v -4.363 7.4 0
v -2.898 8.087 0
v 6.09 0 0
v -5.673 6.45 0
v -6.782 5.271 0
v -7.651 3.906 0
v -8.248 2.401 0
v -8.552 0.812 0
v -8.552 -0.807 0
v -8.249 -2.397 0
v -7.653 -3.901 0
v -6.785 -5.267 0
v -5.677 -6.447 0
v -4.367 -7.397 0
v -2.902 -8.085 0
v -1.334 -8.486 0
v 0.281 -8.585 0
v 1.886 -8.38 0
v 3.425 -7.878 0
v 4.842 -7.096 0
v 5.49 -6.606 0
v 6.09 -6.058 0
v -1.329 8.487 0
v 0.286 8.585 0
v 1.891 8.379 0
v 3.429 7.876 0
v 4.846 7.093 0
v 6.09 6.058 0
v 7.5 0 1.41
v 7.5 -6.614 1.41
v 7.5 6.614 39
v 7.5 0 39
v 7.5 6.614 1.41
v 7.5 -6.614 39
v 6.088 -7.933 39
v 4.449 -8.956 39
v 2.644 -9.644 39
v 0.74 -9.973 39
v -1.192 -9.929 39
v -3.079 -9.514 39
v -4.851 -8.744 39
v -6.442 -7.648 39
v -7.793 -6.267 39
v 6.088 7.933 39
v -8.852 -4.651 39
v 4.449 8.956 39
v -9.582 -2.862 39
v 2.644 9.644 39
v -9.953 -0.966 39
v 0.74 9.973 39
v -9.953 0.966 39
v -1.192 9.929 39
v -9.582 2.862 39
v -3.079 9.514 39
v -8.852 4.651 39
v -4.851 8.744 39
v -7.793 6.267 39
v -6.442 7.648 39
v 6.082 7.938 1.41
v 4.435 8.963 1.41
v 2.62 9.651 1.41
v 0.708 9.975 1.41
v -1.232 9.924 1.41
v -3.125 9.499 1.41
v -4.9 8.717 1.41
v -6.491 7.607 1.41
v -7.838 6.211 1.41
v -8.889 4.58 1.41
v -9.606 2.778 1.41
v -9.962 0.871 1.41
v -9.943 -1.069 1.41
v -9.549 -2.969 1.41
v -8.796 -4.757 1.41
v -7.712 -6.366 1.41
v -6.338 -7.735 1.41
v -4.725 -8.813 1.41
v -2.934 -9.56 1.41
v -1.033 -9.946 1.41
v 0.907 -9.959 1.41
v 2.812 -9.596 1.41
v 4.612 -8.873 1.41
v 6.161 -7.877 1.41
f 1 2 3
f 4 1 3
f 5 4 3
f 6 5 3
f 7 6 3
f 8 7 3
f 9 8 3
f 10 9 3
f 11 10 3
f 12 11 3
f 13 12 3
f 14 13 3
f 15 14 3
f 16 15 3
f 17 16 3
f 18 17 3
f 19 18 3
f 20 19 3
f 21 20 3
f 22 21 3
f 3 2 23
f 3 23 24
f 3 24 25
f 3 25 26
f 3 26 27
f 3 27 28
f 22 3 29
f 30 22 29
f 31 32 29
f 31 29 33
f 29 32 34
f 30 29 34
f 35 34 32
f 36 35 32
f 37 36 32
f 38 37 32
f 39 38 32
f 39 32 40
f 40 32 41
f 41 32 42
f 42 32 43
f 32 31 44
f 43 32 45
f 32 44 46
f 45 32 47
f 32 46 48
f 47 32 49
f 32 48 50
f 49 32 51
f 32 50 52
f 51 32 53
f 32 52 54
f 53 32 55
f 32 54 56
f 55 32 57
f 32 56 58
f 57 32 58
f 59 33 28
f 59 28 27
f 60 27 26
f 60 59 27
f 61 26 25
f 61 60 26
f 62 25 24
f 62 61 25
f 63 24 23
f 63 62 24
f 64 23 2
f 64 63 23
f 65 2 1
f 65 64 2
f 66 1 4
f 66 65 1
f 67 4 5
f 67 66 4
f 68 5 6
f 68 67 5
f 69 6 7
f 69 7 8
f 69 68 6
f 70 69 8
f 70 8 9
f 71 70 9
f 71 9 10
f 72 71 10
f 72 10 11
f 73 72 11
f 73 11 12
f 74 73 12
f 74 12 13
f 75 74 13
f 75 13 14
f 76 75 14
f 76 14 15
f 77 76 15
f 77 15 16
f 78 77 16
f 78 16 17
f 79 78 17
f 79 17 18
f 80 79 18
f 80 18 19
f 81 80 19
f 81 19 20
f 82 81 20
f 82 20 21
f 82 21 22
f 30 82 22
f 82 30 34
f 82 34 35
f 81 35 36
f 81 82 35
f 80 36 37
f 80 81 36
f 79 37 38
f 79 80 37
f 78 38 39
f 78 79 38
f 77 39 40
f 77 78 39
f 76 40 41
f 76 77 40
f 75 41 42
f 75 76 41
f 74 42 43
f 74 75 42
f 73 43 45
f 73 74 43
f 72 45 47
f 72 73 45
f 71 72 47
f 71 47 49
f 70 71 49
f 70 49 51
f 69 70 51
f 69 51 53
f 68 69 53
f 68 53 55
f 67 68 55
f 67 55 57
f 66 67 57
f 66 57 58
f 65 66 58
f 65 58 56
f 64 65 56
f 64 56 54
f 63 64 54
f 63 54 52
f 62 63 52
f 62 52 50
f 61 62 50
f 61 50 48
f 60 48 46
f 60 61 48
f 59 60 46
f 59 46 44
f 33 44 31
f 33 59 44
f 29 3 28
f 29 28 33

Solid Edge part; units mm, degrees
sketch "Sketch1" plane through (0, 0, 0) normal (0, 0, 1) x (1, 0, 0)
  line L0 (7.5, 0) -> (7.5, 6.614378)
  line L1 (7.5, 0) -> (7.5, -6.614378)
  arc A0 (7.499989, -6.61439) -> (7.499989, 6.61439) centre (0, 0) cw
extrude "Protrusion1" add sketch "Sketch1" along normal blind 457.2
sketch "Sketch2" plane through (0, 0, 0) normal (0, 0, 1) x (1, 0, 0)
  line L0 (7.5, 0) -> (7.5, 6.614378)
  line L1 (7.5, 0) -> (7.5, -6.614378)
  arc A0 (7.499989, -6.61439) -> (7.499989, 6.61439) centre (0, 0) cw
sketch "Sketch3" plane through (0, 0, 0) normal (1, 0, 0) x (0, 1, 0)
  line L0 (10, 0) -> (8.59, 0)
  line L1 (8.59, 0) -> (10, 1.41)
  line L2 (10, 1.41) -> (10, 0)
sweep "SweptCutout_4" cut profiles "Sketch3" path "Sketch2"
sketch "Sketch4" plane through (0, 0, 0) normal (1, 0, 0) x (0, 1, 0)
  line L0 (10, 457.2) -> (8.59, 457.2)
  line L1 (8.59, 457.2) -> (10, 455.79)
  line L2 (10, 455.79) -> (10, 457.2)
sketch3d "SweptCutout_5 path"
  arc A0 (7.5, -6.614378, 457.2) -> (-10, 0, 457.2) centre (0, 0, 457.2)
  arc A1 (-10, 0, 457.2) -> (7.5, 6.614378, 457.2) centre (0, 0, 457.2)
  line L2 (7.5, 0, 457.2) -> (7.5, 6.614378, 457.2)
sweep "SweptCutout_5" cut profiles "Sketch4" path "SweptCutout_5 path"
sketch "Sketch5" plane through (0, 0, 39) normal (0, 0, 1) x (1, 0, 0)
  line L0 (25.491064, -13.358298) -> (-25.491064, -13.358298)
  line L1 (-25.491064, -13.358298) -> (-25.491064, 13.358298)
  line L2 (-25.491064, 13.358298) -> (25.491064, 13.358298)
  line L3 (25.491064, 13.358298) -> (25.491064, -13.358298)
extrude "ExtrudedCutout_1" cut sketch "Sketch5" along normal blind 433.531277
